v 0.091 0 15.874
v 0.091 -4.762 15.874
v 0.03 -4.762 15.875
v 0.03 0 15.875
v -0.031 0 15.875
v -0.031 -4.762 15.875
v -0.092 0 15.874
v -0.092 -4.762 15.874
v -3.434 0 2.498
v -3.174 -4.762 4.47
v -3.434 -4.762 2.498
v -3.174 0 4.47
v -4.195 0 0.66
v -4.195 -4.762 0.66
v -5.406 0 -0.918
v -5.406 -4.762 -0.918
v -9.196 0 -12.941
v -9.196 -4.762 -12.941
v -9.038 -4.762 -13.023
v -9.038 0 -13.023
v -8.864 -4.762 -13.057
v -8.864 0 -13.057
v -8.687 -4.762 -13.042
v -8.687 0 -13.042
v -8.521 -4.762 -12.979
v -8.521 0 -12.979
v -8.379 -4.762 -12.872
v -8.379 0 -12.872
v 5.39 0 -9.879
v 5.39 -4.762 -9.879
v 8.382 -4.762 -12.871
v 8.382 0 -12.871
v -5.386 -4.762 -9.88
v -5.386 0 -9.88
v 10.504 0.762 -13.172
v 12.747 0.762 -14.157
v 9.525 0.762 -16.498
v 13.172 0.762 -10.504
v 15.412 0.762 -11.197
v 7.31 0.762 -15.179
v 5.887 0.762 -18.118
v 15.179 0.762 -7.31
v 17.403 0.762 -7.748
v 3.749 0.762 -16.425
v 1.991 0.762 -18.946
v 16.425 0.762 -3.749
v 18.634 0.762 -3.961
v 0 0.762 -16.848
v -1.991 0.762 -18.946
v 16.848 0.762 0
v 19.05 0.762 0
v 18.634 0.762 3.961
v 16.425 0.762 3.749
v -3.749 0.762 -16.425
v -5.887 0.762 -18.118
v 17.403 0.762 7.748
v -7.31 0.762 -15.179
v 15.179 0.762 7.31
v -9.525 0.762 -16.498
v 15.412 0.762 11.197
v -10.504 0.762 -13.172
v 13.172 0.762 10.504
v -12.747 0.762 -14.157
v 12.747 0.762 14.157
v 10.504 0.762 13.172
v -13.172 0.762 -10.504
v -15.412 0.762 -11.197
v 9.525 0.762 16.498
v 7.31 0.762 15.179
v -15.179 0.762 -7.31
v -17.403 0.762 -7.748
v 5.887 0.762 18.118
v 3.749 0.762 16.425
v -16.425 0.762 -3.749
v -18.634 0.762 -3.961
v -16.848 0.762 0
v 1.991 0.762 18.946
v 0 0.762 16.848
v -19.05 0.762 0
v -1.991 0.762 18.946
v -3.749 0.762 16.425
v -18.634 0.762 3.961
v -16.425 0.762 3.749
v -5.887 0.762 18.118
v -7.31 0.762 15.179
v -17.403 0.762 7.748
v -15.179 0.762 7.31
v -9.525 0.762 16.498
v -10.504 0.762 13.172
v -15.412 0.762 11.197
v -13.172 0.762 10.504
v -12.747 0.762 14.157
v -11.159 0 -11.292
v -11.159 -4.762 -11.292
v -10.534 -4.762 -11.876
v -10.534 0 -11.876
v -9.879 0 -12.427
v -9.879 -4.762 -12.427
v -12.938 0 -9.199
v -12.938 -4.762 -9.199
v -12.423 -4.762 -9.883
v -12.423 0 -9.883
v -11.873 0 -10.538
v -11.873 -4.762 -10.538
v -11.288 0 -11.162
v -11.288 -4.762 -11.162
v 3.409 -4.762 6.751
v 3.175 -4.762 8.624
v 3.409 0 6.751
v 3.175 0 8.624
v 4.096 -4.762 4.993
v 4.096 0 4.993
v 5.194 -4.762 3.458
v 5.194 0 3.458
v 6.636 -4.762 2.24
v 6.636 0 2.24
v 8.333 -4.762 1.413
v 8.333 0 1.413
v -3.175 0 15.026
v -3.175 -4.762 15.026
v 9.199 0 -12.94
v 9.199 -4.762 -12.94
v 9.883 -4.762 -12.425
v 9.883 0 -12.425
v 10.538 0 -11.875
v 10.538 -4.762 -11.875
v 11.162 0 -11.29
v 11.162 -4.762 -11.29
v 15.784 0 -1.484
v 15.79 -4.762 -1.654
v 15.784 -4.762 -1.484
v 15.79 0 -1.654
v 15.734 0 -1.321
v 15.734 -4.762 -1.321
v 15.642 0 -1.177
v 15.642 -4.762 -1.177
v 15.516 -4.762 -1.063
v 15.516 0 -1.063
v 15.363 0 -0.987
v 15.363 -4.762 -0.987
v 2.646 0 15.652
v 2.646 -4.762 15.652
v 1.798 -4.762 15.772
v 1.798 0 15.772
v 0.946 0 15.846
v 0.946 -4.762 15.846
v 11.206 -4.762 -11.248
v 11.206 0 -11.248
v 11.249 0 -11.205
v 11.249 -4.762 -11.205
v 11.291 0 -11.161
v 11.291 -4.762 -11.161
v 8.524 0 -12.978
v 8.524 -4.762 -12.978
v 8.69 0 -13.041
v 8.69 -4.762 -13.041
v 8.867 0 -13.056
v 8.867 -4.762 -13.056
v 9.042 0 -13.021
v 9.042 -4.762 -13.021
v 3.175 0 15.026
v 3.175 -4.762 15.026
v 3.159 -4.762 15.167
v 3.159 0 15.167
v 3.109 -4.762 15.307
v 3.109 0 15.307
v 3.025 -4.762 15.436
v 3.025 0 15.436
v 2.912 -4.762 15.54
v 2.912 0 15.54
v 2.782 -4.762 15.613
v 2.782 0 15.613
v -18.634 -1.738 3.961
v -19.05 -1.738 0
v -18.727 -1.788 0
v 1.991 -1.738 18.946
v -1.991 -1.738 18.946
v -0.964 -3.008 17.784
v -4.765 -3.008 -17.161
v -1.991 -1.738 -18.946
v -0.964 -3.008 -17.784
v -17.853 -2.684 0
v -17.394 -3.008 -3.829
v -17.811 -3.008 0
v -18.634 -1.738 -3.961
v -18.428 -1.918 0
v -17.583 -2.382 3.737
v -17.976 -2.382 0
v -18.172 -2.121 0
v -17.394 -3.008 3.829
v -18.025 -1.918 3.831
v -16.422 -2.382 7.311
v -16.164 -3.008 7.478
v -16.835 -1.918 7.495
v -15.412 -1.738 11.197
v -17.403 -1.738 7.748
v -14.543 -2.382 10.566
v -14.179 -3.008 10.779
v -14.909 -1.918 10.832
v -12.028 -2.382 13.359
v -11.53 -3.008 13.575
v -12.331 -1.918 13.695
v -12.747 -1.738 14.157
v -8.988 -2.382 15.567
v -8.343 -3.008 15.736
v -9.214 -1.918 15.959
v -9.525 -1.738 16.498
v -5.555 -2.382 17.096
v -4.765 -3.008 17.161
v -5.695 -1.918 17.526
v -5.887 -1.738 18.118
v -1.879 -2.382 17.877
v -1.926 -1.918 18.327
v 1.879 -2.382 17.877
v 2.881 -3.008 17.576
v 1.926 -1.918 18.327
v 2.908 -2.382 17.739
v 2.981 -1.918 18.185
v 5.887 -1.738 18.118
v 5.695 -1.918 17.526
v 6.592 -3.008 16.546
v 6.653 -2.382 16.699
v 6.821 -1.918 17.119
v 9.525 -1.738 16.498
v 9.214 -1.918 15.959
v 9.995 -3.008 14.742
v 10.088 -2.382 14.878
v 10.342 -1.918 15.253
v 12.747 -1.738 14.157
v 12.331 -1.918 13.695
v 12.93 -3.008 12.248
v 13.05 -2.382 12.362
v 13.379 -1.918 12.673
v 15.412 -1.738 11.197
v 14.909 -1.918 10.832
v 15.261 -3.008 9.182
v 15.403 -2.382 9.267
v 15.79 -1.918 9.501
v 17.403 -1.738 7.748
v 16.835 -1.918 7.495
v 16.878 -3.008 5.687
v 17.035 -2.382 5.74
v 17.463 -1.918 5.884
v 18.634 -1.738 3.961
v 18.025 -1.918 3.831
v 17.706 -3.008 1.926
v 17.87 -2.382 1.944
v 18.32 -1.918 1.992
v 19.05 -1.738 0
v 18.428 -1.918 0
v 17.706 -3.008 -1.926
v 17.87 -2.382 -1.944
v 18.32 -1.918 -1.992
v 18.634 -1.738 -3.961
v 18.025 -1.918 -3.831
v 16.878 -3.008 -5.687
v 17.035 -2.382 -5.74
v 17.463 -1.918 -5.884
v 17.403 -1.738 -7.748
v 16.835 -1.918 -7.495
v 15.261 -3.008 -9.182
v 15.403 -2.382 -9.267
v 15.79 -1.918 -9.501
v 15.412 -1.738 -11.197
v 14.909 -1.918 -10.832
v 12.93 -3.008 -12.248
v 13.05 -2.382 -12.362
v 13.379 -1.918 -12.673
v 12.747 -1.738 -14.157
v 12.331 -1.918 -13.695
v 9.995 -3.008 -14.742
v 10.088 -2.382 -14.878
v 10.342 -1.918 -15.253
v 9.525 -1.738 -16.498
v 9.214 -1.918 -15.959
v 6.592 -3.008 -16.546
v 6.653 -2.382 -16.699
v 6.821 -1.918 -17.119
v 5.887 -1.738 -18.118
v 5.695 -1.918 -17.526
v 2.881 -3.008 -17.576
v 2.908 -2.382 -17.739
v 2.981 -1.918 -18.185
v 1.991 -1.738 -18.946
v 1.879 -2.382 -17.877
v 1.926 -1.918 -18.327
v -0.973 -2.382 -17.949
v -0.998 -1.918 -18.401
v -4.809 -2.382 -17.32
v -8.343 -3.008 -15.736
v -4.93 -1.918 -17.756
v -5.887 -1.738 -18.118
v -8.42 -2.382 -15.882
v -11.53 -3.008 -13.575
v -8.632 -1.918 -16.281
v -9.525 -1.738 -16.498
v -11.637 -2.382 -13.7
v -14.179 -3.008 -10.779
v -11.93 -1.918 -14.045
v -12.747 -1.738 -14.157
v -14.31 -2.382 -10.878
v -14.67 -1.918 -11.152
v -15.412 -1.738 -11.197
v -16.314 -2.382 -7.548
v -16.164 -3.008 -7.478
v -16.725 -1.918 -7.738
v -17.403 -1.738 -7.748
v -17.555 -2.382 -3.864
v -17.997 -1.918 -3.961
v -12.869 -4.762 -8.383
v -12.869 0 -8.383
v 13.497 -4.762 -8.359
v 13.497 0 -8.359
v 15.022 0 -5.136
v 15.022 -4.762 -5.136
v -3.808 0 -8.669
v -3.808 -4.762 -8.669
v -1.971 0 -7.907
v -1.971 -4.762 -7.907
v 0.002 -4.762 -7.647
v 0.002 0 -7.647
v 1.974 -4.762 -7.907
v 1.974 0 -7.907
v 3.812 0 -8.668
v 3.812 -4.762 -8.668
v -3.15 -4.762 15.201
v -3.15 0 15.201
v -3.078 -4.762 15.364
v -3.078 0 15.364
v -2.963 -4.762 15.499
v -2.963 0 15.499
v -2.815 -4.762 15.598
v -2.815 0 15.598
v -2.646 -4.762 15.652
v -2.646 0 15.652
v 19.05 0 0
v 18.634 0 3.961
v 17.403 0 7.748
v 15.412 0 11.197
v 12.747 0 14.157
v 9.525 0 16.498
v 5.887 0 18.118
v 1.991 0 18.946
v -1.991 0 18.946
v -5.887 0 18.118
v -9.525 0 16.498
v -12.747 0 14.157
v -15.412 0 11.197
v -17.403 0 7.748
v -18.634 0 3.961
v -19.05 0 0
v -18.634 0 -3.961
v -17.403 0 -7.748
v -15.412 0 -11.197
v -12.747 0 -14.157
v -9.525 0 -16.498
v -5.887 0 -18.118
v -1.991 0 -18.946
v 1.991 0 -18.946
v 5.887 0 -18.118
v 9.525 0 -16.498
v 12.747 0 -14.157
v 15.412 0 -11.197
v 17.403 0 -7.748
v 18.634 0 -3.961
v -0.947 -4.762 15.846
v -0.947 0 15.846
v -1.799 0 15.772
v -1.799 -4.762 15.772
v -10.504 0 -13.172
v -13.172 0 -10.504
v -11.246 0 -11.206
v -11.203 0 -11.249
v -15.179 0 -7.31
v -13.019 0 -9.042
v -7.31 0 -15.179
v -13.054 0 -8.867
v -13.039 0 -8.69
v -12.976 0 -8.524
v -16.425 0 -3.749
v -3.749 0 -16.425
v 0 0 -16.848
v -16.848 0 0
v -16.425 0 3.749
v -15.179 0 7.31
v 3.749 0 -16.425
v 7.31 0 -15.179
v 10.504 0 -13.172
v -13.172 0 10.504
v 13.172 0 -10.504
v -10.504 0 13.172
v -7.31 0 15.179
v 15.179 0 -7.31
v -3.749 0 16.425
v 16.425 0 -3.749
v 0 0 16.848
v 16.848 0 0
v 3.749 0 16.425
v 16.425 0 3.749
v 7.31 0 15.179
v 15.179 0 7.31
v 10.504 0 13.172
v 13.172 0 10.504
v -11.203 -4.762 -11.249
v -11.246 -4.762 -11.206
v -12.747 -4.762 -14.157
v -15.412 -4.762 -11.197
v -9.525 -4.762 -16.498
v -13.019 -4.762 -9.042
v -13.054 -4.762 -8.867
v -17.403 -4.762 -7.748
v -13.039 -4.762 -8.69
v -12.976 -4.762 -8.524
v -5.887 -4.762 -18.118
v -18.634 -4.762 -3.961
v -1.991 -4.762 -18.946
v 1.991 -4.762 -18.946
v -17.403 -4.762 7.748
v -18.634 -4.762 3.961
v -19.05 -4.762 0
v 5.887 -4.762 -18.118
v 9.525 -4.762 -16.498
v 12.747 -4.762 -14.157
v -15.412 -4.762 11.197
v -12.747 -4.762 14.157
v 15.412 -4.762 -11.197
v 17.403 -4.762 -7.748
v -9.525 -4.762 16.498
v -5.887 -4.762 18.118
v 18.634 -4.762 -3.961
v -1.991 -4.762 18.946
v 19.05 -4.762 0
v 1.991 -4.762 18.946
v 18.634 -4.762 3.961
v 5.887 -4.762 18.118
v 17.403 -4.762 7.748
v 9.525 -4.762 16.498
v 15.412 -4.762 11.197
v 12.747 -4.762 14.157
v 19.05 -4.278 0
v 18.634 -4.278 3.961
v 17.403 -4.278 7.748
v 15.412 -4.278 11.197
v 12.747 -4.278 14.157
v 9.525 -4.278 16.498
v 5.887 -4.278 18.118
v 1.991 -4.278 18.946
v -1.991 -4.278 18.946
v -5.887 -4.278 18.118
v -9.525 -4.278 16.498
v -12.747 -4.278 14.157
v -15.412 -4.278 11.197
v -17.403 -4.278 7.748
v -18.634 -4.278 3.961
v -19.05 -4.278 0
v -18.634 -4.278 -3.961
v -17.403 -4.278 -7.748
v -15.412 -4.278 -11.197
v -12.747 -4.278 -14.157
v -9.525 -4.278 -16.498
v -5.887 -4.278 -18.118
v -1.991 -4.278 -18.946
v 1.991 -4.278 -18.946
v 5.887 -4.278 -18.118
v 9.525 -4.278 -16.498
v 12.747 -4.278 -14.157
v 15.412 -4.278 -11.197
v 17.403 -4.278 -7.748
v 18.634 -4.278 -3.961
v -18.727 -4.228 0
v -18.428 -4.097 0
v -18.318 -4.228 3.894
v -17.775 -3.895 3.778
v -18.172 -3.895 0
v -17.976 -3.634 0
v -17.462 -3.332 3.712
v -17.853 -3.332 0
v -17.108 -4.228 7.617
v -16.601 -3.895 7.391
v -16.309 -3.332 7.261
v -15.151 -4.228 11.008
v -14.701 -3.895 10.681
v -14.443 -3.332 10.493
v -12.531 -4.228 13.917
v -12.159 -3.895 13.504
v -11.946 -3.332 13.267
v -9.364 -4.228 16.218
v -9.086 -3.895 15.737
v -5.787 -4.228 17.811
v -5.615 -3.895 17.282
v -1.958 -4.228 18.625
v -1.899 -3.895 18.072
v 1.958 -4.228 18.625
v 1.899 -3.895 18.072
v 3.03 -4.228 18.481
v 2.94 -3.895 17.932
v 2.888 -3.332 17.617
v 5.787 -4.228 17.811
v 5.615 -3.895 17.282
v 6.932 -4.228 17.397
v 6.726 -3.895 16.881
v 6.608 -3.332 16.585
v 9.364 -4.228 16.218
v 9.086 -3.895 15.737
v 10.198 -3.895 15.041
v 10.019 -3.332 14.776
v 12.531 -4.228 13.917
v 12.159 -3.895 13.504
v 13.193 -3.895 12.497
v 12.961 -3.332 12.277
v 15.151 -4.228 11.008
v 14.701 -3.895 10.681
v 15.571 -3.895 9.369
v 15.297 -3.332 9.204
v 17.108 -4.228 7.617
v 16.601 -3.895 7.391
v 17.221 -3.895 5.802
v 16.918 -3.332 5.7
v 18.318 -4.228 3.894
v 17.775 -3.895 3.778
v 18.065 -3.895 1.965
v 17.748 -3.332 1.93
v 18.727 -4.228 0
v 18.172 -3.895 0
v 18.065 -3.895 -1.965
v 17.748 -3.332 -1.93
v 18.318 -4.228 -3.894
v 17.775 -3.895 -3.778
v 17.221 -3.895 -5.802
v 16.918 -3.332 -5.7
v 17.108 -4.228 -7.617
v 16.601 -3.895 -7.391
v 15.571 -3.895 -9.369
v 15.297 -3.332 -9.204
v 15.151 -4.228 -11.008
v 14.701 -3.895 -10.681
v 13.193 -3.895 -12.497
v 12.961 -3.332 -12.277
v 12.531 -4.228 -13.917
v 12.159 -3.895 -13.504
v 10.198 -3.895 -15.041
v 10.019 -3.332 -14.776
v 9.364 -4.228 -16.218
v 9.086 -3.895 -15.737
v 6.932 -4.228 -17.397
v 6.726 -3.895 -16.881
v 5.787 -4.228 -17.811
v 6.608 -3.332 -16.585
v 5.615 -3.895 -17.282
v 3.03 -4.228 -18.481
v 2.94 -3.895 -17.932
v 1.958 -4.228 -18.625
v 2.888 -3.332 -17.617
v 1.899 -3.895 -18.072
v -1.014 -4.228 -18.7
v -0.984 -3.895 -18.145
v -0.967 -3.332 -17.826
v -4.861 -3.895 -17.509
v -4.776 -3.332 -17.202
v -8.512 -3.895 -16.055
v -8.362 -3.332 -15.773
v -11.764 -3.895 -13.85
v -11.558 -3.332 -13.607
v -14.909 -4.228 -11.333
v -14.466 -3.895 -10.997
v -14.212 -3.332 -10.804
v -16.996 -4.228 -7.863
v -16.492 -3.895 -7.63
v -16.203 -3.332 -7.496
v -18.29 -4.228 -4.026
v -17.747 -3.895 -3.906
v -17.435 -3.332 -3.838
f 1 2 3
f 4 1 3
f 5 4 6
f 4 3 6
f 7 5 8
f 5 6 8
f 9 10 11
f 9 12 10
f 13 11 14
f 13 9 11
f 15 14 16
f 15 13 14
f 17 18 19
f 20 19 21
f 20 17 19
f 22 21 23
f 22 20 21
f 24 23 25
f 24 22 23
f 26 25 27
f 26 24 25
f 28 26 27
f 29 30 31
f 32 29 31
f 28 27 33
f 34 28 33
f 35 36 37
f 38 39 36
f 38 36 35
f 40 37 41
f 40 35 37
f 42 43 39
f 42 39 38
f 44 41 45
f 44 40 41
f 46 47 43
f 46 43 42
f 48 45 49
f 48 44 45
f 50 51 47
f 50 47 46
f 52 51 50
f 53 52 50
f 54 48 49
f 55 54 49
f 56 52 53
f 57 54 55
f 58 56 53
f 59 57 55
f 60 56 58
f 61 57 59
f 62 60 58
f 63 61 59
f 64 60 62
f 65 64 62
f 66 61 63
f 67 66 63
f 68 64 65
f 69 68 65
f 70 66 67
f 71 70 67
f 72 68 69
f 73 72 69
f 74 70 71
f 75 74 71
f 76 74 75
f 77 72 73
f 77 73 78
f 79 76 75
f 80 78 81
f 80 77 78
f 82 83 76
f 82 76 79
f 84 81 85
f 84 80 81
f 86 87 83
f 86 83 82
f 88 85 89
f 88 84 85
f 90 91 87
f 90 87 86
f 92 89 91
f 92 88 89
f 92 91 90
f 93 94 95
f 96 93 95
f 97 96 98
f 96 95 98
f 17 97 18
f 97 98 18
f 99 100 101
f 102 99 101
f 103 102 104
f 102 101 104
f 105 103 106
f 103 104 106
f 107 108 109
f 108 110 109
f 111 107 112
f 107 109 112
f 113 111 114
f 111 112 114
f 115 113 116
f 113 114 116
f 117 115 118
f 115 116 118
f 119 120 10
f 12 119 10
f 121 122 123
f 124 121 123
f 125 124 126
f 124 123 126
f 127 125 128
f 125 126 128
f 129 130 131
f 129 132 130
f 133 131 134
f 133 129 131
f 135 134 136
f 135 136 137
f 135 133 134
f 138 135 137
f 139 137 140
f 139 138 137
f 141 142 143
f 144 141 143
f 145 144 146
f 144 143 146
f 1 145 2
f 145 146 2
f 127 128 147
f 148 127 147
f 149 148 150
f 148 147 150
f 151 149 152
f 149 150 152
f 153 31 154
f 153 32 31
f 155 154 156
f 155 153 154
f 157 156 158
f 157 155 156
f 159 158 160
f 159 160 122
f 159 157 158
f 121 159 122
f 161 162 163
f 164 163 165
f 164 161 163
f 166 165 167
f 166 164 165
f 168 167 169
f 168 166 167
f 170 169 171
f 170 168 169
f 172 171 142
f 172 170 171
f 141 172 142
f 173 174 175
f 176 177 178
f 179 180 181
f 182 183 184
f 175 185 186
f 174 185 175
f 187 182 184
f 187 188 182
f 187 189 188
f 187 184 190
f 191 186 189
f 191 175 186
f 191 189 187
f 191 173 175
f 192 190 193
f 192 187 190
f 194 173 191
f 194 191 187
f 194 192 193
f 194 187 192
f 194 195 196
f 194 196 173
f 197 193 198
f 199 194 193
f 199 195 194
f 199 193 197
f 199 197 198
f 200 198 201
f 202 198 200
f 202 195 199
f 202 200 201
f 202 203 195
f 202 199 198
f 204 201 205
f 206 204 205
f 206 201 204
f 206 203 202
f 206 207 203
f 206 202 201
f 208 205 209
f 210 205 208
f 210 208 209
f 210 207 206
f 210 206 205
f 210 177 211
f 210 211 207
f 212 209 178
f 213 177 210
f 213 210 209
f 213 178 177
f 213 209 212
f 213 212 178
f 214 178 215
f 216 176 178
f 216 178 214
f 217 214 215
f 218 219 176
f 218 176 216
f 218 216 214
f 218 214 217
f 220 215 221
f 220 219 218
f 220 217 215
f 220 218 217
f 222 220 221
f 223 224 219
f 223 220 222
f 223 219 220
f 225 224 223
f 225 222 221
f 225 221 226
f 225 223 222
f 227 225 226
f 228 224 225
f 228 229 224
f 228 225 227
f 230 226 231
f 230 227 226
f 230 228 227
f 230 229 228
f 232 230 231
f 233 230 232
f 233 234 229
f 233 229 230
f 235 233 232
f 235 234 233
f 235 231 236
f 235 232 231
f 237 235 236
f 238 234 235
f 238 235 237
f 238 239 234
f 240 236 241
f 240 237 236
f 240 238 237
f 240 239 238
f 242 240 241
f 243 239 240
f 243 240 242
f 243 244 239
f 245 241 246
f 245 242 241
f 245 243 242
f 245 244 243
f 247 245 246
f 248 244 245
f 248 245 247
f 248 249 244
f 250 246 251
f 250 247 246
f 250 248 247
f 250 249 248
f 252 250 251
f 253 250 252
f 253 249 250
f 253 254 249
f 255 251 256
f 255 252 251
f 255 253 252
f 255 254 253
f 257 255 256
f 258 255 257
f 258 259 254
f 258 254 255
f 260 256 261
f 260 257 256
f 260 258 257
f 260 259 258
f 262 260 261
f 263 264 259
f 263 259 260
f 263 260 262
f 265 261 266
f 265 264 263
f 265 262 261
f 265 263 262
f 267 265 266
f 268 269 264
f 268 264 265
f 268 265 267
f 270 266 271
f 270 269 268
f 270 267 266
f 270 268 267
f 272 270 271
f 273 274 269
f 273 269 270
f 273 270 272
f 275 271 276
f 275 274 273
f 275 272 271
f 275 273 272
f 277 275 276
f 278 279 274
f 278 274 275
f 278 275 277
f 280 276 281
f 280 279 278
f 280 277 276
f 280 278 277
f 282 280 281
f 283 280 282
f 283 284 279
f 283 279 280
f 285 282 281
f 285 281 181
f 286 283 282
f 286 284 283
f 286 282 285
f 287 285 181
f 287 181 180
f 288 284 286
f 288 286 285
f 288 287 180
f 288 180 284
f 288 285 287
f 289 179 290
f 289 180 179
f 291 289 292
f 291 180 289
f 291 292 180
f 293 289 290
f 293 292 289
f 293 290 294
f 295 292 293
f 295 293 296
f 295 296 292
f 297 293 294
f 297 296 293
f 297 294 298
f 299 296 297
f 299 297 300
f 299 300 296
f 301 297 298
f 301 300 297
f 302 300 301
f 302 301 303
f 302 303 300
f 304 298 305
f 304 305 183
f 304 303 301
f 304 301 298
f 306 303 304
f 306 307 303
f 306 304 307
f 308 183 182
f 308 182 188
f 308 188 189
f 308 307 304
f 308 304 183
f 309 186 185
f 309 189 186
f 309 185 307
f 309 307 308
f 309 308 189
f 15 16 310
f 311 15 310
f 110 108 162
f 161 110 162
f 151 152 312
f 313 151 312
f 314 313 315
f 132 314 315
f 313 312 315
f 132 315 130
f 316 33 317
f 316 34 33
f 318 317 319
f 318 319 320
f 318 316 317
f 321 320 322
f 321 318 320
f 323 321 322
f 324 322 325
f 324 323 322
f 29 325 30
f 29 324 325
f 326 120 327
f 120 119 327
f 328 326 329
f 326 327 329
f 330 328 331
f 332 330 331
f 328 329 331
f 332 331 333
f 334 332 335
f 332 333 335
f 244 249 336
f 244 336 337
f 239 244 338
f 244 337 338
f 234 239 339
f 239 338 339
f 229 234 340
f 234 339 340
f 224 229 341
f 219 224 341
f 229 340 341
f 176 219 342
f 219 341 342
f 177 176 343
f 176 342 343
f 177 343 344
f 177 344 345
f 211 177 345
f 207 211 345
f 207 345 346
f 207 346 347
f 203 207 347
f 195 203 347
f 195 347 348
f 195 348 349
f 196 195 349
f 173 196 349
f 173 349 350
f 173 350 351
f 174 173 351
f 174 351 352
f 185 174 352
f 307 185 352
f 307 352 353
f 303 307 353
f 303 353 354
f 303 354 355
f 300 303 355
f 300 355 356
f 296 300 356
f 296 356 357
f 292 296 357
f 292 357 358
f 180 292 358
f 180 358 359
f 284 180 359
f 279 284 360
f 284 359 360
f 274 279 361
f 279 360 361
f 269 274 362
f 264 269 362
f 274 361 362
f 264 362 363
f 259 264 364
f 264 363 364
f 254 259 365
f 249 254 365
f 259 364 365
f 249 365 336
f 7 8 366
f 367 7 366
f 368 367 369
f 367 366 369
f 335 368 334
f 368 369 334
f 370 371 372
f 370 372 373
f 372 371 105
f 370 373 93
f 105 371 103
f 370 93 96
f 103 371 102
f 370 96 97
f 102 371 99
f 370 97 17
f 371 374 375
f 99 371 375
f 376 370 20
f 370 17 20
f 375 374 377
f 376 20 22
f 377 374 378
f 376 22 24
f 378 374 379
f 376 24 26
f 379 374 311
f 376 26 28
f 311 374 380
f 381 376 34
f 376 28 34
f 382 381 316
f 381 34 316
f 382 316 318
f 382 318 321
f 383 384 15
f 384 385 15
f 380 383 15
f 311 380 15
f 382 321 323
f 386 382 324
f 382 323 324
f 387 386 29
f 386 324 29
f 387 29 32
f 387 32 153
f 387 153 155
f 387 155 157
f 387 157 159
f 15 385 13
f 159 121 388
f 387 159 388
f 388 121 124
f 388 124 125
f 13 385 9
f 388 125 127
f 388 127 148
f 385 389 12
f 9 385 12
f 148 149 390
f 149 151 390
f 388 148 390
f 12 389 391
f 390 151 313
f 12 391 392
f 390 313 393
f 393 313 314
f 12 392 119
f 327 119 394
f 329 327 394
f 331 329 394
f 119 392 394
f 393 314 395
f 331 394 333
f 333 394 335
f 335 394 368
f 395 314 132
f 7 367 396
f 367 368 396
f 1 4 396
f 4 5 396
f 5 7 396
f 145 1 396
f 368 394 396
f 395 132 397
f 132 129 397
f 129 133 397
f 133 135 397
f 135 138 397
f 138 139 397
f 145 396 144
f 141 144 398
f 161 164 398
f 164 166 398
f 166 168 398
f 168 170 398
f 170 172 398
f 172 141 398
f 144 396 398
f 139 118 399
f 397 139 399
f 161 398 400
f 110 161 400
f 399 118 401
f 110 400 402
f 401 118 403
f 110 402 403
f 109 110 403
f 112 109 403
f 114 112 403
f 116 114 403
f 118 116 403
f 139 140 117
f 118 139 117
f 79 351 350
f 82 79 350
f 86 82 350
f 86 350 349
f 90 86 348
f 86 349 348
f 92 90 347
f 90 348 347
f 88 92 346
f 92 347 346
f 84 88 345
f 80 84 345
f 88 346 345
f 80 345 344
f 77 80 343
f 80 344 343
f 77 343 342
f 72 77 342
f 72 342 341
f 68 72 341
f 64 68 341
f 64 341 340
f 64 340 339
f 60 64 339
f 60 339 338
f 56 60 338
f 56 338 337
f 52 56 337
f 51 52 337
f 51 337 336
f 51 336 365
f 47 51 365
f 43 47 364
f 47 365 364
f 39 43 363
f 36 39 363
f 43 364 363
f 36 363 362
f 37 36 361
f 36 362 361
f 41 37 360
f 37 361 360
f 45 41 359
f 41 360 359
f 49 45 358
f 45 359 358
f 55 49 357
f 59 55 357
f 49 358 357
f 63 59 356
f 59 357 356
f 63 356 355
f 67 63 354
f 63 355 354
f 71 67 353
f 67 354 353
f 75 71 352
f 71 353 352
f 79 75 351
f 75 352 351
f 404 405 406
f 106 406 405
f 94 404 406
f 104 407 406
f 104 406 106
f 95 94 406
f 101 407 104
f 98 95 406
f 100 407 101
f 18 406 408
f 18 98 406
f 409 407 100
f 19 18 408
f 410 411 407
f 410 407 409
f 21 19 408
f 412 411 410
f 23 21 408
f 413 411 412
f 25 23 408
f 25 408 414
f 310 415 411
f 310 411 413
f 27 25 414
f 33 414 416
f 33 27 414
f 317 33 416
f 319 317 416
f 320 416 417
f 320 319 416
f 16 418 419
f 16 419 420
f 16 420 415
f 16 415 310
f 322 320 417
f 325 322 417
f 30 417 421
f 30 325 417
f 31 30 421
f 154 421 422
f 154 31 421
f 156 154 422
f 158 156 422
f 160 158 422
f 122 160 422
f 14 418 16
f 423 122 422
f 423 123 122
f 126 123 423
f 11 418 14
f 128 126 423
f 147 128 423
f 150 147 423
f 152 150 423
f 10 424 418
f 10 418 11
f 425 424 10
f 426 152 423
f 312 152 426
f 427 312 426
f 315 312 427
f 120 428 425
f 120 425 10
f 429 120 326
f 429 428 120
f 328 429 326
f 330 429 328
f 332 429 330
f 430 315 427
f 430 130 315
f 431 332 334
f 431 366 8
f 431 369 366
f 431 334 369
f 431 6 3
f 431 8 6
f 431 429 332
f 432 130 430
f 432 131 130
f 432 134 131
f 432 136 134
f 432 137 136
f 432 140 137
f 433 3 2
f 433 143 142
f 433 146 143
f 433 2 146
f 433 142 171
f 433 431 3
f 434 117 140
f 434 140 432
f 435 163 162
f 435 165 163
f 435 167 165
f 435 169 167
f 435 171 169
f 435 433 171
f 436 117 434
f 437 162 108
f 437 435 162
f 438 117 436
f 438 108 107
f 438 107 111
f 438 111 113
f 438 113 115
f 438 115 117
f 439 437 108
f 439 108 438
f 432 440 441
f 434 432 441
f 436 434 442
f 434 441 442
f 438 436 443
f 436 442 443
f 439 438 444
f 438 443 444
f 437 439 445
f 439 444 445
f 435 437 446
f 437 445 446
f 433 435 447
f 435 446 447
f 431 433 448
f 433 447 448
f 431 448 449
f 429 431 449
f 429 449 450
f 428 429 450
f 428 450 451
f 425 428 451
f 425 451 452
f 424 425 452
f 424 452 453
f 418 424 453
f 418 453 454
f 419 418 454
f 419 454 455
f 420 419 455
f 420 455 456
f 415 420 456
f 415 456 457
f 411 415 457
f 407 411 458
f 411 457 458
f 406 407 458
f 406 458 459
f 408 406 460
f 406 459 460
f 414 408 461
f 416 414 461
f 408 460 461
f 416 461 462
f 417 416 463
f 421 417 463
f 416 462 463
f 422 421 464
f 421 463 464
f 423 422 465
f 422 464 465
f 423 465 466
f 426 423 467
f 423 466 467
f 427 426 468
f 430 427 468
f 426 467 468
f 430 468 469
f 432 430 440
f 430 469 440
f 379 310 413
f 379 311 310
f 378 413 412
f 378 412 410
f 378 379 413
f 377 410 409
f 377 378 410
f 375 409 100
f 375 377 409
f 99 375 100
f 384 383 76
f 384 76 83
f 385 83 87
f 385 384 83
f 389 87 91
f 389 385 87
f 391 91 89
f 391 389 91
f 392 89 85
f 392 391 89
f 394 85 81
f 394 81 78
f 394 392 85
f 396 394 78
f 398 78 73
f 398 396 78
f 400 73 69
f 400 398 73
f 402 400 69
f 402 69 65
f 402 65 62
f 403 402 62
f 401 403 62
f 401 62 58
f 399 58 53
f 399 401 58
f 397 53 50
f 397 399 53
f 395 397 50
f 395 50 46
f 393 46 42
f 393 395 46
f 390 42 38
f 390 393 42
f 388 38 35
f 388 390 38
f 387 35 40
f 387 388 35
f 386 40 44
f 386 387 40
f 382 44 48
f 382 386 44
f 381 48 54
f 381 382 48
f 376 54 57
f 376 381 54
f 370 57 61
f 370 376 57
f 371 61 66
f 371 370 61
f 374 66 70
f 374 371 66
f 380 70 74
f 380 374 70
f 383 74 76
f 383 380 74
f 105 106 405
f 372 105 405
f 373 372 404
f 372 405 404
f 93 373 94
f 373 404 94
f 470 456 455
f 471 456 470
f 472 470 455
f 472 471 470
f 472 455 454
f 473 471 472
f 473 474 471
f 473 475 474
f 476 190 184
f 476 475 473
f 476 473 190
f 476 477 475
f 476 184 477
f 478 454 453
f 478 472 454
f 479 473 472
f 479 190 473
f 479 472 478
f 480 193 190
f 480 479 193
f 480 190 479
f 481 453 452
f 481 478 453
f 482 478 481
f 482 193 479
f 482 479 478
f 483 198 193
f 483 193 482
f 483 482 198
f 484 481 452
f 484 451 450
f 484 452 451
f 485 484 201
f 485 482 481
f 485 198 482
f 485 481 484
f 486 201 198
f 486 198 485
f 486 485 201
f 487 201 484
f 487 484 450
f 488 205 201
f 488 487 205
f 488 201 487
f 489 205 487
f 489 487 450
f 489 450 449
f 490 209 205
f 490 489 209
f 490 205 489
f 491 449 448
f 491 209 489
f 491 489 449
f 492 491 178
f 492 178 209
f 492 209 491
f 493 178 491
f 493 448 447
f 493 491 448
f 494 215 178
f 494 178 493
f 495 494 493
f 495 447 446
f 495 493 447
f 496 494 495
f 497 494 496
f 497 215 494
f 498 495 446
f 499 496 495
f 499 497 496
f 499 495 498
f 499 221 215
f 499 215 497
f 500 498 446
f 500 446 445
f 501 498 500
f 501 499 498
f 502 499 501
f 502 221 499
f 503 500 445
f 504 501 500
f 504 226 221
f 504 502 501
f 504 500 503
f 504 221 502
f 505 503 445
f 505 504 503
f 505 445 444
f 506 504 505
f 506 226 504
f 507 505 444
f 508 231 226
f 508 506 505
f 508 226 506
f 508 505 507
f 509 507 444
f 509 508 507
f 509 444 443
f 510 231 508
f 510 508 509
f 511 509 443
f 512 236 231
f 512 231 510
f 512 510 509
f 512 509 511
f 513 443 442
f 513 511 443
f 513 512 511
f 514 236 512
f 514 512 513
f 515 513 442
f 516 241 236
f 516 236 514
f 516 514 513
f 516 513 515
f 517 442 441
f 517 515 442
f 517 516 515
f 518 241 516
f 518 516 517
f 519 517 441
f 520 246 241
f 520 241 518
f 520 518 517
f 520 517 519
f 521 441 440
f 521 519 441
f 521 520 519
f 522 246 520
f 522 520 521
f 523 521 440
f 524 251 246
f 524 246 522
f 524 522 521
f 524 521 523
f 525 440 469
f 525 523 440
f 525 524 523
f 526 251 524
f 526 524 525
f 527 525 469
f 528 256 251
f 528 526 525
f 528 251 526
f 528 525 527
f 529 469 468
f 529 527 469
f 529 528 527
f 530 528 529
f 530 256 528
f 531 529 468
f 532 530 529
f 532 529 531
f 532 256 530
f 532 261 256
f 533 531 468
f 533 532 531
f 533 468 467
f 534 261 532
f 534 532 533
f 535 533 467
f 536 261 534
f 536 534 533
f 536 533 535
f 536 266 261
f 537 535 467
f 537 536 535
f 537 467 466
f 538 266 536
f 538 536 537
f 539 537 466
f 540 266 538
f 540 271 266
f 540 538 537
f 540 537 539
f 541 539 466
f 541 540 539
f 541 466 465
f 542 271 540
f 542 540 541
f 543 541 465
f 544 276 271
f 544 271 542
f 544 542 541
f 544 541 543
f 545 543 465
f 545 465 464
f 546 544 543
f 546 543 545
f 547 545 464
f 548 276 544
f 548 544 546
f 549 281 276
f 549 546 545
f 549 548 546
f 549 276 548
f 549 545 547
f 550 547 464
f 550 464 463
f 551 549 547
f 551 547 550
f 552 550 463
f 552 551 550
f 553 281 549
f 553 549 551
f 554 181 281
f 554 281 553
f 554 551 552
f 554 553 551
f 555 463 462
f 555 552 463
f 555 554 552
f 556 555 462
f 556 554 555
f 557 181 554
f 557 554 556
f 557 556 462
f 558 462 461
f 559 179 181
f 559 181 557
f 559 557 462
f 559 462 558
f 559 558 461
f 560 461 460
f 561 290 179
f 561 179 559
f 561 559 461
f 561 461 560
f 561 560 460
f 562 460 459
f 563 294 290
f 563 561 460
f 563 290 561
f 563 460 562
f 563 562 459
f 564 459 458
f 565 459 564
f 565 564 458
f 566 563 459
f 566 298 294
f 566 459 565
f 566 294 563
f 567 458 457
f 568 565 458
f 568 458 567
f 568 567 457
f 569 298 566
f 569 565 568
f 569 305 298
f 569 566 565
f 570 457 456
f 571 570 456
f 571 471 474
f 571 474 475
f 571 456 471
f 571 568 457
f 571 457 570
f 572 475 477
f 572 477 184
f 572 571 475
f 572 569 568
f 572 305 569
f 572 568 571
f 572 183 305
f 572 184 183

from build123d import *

# Parameters (mm, degrees)
F0_R     = 19.05
F1_DEPTH = 4.7625
F3_DEPTH = 25.4
F4_R     = 0.635
F5_R     = 7.62
F6_R     = 19.05
F6_R_2   = 16.8477682608
F7_DEPTH = 0.762
F8_R     = 1.27


with BuildPart() as f1:
    # F0 (on Front) → F1 (new body)
    with BuildSketch(Plane.XZ):
        Circle(F0_R)
    extrude(amount=F1_DEPTH)

    # F2 (on face) → F3 (cut)
    with BuildSketch(Plane.XZ.offset(4.7625)):
        with BuildLine():
            ThreePointArc((-13.2419744131, -8.7555045953), (-12.3238425839, -10.0067993588), (-11.2879133137, -11.1624615879))
            ThreePointArc((-11.2879133137, -11.1624615879), (-11.2235221627, -11.2272144784), (-11.1587595957, -11.2915958968))
            ThreePointArc((-11.1587595957, -11.2915958968), (-10.0029416889, -12.32735147), (-8.7515089527, -13.2452952306))
            Line((-8.7515089527, -13.2452952306), (0.0012918382, -4.4911788753))
            Line((0.0012918382, -4.4911788753), (8.7554081934, -13.2439796662))
            ThreePointArc((8.7554081934, -13.2439796662), (10.006702957, -12.325847837), (11.1623651861, -11.2899185668))
            ThreePointArc((11.1623651861, -11.2899185668), (11.2271180766, -11.2255274158), (11.291499495, -11.1607648488))
            ThreePointArc((11.291499495, -11.1607648488), (14.4575372164, -6.5602305791), (15.8344708919, -1.1479515698))
            Line((15.8344708919, -1.1479515698), (3.1757157521, 3.1741877502))
            Line((3.1757157521, 3.1741877502), (3.1747959638, 15.4156336391))
            Line((3.1747959638, 15.4156336391), (3.1747856088, 15.5534475772))
            ThreePointArc((3.1747856088, 15.5534475772), (1.6407693424, 15.7890293509), (0.0910801197, 15.8736933393))
            ThreePointArc((0.0910801197, 15.8736933393), (-0.0002385077, 15.8739491277), (-0.0915570956, 15.8736796149))
            ThreePointArc((-0.0915570956, 15.8736796149), (-1.6412335946, 15.7887827216), (-3.1752144554, 15.5529703966))
            Line((-3.1752144554, 15.5529703966), (-3.1741441565, 1.3138388775))
            Line((-3.1741441565, 1.3138388775), (-13.2419744131, -8.7555045953))
        make_face()
        with BuildLine():
            Line((-3.1740454005, 0), (-3.1741441565, 1.3138388775))
            Line((-3.1741441565, 1.3138388775), (-2.2442783045, 2.2438444902))
            ThreePointArc((-2.2442783045, 2.2438444902), (-2.9322076505, 1.2143442667), (-3.1740454005, 0))
        make_face(mode=Mode.SUBTRACT)
        with BuildLine():
            Line((-2.2442783045, 2.2438444902), (-3.1741441565, 1.3138388775))
            Line((-3.1741441565, 1.3138388775), (-3.1740454005, 0))
            ThreePointArc((-3.1740454005, 0), (-2.9322076505, 1.2143442667), (-2.2442783045, 2.2438444902))
        make_face()
        with BuildLine():
            ThreePointArc((-11.1587595957, -11.2915958968), (-11.2235221627, -11.2272144784), (-11.2879133137, -11.1624615879))
            ThreePointArc((-11.2879133137, -11.1624615879), (-11.2242651795, -11.2279576068), (-11.1587595957, -11.2915958968))
        make_face()
        with BuildLine():
            ThreePointArc((0.0910801197, 15.8736933393), (-0.0002385867, 15.874999991), (-0.0915570956, 15.8736796149))
            ThreePointArc((-0.0915570956, 15.8736796149), (-0.0002385077, 15.8739491277), (0.0910801197, 15.8736933393))
        make_face()
        with BuildLine():
            ThreePointArc((11.291499495, -11.1607648488), (11.2271180766, -11.2255274158), (11.1623651861, -11.2899185668))
            ThreePointArc((11.1623651861, -11.2899185668), (11.227861205, -11.2262704326), (11.291499495, -11.1607648488))
        make_face()
    extrude(amount=-F3_DEPTH, mode=Mode.SUBTRACT)

    # F4
    f4_edges = [f1.edges().sort_by_distance(p)[0] for p in [
        (-13.241974, -2.38125, -8.755505),
        (-8.751509, -2.38125, -13.245295),
        (8.755408, -2.38125, -13.24398),
        (15.834471, -2.38125, -1.147952),
        (3.174786, -2.38125, 15.553448),
        (-3.175214, -2.38125, 15.55297),
    ]]
    fillet(f4_edges, radius=F4_R)

    # F5
    f5_edges = [f1.edges().sort_by_distance(p)[0] for p in [
        (-3.174144, -2.38125, 1.313839),
        (0.001292, -2.38125, -4.491179),
        (3.175716, -2.38125, 3.174188),
    ]]
    fillet(f5_edges, radius=F5_R)

    # F6 (on face) → F7 (join)
    with BuildSketch(Plane(origin=(0, 0, 0), x_dir=(-1, 0, 0), z_dir=(0, 1, 0))):
        Circle(F6_R)
        Circle(F6_R_2, mode=Mode.SUBTRACT)
    extrude(amount=F7_DEPTH)

    # F8 (on Top) → F9 (revolve, cut)
    with BuildSketch(Plane.XY):
        with Locations((-19.0806053579, -3.0079341959)):
            Circle(F8_R)
    revolve(axis=Axis((0, 0.762, 0), (0, 1, 0)), mode=Mode.SUBTRACT)


solid = f1.part
